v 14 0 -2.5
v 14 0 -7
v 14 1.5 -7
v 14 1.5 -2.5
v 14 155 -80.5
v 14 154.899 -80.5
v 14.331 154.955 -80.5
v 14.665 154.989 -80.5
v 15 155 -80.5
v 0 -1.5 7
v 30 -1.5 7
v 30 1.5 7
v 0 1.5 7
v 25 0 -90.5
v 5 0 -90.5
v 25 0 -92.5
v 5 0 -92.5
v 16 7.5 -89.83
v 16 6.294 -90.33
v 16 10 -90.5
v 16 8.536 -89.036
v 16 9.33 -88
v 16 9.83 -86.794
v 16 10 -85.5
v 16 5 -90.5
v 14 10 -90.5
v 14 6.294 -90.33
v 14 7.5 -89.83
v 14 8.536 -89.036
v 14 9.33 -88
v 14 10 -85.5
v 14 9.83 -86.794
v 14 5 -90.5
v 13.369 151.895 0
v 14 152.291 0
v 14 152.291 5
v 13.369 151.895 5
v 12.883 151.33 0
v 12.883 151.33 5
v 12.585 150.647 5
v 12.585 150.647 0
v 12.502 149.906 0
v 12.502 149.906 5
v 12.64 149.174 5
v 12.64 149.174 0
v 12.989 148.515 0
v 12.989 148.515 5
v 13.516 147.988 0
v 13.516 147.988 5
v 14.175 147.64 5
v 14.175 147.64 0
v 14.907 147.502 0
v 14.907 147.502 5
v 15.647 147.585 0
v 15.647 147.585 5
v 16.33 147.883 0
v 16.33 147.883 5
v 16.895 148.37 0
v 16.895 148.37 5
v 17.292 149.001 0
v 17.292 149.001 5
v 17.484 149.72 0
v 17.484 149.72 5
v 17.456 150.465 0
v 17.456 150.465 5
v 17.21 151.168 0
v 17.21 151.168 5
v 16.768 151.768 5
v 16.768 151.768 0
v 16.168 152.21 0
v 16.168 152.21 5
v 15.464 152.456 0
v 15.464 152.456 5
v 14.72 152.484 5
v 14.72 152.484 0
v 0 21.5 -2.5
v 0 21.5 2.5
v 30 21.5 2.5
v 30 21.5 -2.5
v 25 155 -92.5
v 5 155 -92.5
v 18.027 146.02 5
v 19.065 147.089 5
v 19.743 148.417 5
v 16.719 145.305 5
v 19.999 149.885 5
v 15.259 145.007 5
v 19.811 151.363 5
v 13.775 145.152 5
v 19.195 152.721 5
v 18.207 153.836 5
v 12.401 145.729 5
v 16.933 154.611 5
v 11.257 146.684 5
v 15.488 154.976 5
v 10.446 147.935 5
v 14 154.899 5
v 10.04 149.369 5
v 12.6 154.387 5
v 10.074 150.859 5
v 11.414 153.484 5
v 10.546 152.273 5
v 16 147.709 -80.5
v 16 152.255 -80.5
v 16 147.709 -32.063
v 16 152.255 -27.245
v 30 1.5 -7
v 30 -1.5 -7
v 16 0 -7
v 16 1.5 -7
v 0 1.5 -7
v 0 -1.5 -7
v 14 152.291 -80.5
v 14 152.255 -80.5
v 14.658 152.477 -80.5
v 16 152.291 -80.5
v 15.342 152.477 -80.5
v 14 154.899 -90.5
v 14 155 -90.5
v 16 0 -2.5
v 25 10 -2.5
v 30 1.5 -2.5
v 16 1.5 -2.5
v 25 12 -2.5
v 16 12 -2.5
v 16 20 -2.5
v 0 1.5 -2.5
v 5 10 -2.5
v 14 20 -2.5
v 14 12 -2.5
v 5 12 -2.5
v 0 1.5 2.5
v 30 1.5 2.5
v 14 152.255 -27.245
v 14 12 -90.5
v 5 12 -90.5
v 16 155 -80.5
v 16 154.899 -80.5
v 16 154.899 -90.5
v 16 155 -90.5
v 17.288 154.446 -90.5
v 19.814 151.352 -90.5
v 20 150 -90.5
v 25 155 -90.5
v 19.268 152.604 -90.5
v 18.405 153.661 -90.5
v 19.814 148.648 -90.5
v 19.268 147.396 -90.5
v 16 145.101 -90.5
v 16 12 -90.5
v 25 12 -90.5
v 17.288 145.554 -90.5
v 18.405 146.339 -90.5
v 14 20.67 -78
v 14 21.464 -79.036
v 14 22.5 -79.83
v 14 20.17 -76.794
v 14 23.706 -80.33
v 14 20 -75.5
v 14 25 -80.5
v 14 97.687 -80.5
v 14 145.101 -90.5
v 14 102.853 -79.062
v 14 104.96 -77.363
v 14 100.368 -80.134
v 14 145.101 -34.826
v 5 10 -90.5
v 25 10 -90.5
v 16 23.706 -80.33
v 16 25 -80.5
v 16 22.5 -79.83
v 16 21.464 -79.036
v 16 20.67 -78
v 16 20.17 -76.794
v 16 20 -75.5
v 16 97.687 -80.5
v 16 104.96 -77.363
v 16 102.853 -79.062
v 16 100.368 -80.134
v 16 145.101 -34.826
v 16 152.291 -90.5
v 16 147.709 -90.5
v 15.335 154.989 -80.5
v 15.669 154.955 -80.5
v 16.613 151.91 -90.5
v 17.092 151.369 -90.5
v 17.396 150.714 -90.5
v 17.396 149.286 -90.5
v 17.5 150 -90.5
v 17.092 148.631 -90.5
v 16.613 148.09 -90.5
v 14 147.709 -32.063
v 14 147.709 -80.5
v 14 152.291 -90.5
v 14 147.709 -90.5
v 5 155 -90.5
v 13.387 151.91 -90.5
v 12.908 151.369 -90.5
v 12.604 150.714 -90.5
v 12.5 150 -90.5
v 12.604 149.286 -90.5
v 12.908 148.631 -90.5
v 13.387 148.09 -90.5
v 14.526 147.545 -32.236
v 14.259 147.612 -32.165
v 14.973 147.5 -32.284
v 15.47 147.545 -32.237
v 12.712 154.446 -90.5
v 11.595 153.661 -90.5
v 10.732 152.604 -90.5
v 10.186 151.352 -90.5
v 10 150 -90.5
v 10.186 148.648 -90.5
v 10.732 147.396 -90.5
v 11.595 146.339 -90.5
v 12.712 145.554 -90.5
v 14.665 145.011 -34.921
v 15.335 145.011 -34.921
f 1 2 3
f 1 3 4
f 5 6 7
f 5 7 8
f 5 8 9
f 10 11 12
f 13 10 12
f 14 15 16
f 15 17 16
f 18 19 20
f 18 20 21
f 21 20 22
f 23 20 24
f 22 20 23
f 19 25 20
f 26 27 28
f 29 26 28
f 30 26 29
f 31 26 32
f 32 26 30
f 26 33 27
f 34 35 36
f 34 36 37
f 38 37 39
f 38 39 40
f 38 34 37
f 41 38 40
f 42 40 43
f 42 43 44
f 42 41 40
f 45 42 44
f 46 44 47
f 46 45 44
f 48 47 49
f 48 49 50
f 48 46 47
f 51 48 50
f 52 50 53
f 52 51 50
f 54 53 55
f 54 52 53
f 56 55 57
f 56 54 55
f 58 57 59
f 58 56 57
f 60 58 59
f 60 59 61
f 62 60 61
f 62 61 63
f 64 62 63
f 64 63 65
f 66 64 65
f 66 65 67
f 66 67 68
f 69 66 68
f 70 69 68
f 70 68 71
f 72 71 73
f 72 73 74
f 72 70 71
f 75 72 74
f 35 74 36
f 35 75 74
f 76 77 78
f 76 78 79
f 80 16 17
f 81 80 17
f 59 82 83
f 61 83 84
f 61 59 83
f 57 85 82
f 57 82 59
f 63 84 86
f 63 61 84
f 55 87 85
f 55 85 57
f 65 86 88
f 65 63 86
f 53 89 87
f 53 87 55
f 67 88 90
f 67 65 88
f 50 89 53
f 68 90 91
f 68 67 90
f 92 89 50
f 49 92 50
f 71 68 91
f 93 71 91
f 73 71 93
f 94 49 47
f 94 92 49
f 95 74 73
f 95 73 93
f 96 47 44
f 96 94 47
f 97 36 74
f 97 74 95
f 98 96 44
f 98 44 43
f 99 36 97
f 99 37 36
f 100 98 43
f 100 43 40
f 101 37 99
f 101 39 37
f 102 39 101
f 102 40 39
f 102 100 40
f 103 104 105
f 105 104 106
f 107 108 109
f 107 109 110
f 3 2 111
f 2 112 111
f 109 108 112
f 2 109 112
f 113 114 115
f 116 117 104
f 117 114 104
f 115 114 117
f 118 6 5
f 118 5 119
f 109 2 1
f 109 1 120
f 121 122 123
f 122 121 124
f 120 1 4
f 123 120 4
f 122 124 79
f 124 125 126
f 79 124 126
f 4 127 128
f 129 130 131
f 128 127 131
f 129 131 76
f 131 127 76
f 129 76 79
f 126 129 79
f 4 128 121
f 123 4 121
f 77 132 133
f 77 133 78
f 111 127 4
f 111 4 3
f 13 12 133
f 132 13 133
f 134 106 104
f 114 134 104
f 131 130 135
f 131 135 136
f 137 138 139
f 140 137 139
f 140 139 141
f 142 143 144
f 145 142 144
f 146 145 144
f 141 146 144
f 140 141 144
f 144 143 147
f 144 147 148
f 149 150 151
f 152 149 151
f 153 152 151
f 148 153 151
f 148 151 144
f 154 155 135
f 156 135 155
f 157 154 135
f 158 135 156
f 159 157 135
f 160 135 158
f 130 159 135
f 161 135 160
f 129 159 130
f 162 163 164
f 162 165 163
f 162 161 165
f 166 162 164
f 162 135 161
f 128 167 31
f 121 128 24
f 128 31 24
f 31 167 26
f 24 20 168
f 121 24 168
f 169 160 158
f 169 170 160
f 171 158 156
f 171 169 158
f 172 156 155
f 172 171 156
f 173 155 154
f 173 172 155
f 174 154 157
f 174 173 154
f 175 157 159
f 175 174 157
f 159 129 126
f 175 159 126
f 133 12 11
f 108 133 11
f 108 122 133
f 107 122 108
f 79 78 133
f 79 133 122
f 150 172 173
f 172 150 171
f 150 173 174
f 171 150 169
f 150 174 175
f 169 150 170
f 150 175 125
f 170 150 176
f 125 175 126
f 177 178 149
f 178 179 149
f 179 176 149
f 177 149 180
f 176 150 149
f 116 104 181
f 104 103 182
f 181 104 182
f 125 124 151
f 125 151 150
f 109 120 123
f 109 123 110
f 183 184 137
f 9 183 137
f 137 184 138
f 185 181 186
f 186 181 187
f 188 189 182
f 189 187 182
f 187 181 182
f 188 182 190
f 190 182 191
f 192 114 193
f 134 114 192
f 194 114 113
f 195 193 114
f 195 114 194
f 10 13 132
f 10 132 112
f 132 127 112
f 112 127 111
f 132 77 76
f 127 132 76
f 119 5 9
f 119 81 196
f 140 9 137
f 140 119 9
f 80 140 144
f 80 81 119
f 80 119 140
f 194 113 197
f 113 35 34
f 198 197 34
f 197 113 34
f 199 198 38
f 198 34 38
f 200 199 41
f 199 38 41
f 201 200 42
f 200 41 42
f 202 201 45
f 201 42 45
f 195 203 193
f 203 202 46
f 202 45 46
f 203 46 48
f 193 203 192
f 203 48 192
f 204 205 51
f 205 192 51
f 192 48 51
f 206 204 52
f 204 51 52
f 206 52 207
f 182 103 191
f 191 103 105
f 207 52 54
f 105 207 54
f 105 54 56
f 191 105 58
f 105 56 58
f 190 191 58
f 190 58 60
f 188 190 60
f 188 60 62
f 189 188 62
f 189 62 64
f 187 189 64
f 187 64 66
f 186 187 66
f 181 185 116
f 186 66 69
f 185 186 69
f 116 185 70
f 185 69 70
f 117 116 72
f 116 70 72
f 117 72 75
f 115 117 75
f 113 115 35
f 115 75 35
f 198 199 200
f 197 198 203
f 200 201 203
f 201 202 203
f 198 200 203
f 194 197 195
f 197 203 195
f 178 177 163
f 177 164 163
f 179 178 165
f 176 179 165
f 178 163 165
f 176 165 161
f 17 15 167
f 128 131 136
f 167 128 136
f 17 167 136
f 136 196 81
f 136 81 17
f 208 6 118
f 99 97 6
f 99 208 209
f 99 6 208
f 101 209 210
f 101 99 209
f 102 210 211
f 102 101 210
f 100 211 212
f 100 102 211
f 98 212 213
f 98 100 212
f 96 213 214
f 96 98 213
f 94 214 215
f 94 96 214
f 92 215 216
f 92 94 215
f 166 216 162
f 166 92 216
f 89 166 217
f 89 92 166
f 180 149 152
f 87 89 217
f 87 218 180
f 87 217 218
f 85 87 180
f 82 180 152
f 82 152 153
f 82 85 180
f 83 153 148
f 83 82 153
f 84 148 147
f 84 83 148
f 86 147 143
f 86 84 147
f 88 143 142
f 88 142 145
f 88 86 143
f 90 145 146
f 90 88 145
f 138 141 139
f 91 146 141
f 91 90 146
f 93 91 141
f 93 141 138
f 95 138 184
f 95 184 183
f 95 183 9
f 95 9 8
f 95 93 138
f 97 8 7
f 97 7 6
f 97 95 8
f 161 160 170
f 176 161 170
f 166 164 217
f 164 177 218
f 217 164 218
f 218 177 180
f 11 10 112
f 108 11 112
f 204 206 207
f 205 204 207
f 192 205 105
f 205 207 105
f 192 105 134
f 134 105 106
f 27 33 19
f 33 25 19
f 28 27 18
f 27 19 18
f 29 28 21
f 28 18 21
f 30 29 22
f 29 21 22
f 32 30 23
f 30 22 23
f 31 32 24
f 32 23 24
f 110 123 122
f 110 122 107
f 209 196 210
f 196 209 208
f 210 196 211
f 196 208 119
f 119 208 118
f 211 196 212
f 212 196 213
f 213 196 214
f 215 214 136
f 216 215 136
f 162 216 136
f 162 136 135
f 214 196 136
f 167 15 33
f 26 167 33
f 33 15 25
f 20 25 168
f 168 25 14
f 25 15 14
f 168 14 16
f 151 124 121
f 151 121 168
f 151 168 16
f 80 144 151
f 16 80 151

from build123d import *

# Parameters (mm, degrees)
SKETCH1_W                       = 5
SKETCH1_H                       = 20
SKETCH1_W_2                     = 14
SKETCH1_H_2                     = 3
BOSS_EXTRUDE1_DEPTH             = 30
SKETCH4_W                       = 9
SKETCH4_H                       = 2
SKETCH4_W_2                     = 2
SKETCH4_H_2                     = 10
BOSS_EXTRUDE2_DEPTH             = 155
SKETCH4_4_W                     = 2
SKETCH4_4_H                     = 78
BOSS_EXTRUDE3_DEPTH             = 20
SKETCH4_5_W                     = 2
SKETCH4_5_H                     = 10
SKETCH4_5_H_2                   = 78
CUT_EXTRUDE1_DEPTH              = 10
BOSS_EXTRUDE4_REACH             = 184.979
SKETCH2_R                       = 5
SKETCH2_R_2                     = 2.5
BOSS_EXTRUDE4_DIRECTION_2_DEPTH = 5
FILLET1_R                       = 5
BOSS_EXTRUDE6_DEPTH             = 2
FILLET2_R                       = 10
BOSS_EXTRUDE7_DEPTH             = 1
BOSS_EXTRUDE7_DEPTH_BACK        = 1
SKETCH5_W                       = 20
SKETCH5_H                       = 91


with BuildPart() as part:
    # Sketch1 → Boss-Extrude1 (new body)
    with BuildSketch(Plane(origin=(0, 0, 0), x_dir=(0, 0, -1), z_dir=(1, 0, 0))):
        with Locations((0, 11.5)):
            Rectangle(SKETCH1_W, SKETCH1_H)
        Rectangle(SKETCH1_W_2, SKETCH1_H_2)
    extrude(amount=BOSS_EXTRUDE1_DEPTH)



with BuildPart() as body_2:
    # Sketch4 → Boss-Extrude2 (new body)
    with BuildSketch(Plane(origin=(0, 0, 0), x_dir=(1, 0, 0), z_dir=(0, 1, 0))):
        with Locations((20.5, 91.5)):
            Rectangle(SKETCH4_W, SKETCH4_H)
        with Locations((15, 91.5)):
            Rectangle(SKETCH4_W_2, SKETCH4_H)
        with Locations((9.5, 91.5)):
            Rectangle(SKETCH4_W, SKETCH4_H)
        with Locations((15, 85.5)):
            Rectangle(SKETCH4_W_2, SKETCH4_H_2)
    extrude(amount=BOSS_EXTRUDE2_DEPTH)


with BuildPart() as part_1:
    add(part.part)

    add(body_2.part)  # Boss-Extrude3 merges body 2
    # Sketch4<4> → Boss-Extrude3 (add)
    with BuildSketch(Plane(origin=(0, 0, 0), x_dir=(1, 0, 0), z_dir=(0, 1, 0))):
        with Locations((15, 41.5)):
            Rectangle(SKETCH4_4_W, SKETCH4_4_H)
    extrude(amount=BOSS_EXTRUDE3_DEPTH)

    # Sketch4<5> → Cut-Extrude1 (cut)
    with BuildSketch(Plane(origin=(0, 0, 0), x_dir=(1, 0, 0), z_dir=(0, 1, 0))):
        with Locations((15, 85.5)):
            Rectangle(SKETCH4_5_W, SKETCH4_5_H)
        with Locations((15, 41.5)):
            Rectangle(SKETCH4_5_W, SKETCH4_5_H_2)
    extrude(amount=CUT_EXTRUDE1_DEPTH, mode=Mode.SUBTRACT)

    # Boss-Extrude4: up to this face of the body (flat: up to its plane)
    boss_extrude4_end = Plane(part_1.part.faces().sort_by_distance((15, 77.5, -92.5))[0])
    # Sketch2 → Boss-Extrude4 (add, up to the picked face)
    with BuildSketch(Plane.XY, mode=Mode.PRIVATE) as boss_extrude4_sk1:
        with Locations(Location((15, 150, 0), (0, 0, 101.536959033))):
            Circle(SKETCH2_R)
        with Locations(Location((15, 150, 0), (0, 0, 113.578178478))):
            Circle(SKETCH2_R_2, mode=Mode.SUBTRACT)
    boss_extrude4_tool1 = split(extrude(boss_extrude4_sk1.sketch, amount=-BOSS_EXTRUDE4_REACH, mode=Mode.PRIVATE), bisect_by=boss_extrude4_end, keep=Keep.BOTH, mode=Mode.PRIVATE)
    add(boss_extrude4_tool1.solids().sort_by(Axis((15.971716, 145.239585, 0), (0, 0, -1)))[0])

    # Sketch2 → Boss-Extrude4 direction 2 (add)
    with BuildSketch(Plane.XY):
        with Locations(Location((15, 150, 0), (0, 0, 101.536959033))):
            Circle(SKETCH2_R)
        with Locations(Location((15, 150, 0), (0, 0, 113.578178478))):
            Circle(SKETCH2_R_2, mode=Mode.SUBTRACT)
    extrude(amount=BOSS_EXTRUDE4_DIRECTION_2_DEPTH)

    # Fillet1
    fillet1_edges = [part_1.edges().sort_by_distance(p)[0] for p in [
        (15, 20, -80.5),
        (15, 10, -90.5),
    ]]
    fillet(fillet1_edges, radius=FILLET1_R)

    # Sketch6 → Boss-Extrude6 (add)
    with BuildSketch(Plane(origin=(16, 0, 0), x_dir=(0, 0, -1), z_dir=(1, 0, 0))):
        Polygon((80.5, 102), (27.244802727, 152.255197273), (80.5, 152.255197273), align=None)
    extrude(amount=-BOSS_EXTRUDE6_DEPTH)

    # Fillet2
    fillet2_edges = [part_1.edges().sort_by_distance(p)[0] for p in [
        (15, 102, -80.5),
    ]]
    fillet(fillet2_edges, radius=FILLET2_R)

    # Sketch5 → Boss-Extrude7 (add, two sides: drawn at the far end of the back side and taken through both)
    with BuildSketch(Plane(origin=(0, 11, 0), x_dir=(-1, 0, 0), z_dir=(0, -1, 0)).offset(-BOSS_EXTRUDE7_DEPTH_BACK)):
        with Locations((-15, 45)):
            Rectangle(SKETCH5_W, SKETCH5_H)
    extrude(amount=BOSS_EXTRUDE7_DEPTH + BOSS_EXTRUDE7_DEPTH_BACK)


solid = part_1.part
